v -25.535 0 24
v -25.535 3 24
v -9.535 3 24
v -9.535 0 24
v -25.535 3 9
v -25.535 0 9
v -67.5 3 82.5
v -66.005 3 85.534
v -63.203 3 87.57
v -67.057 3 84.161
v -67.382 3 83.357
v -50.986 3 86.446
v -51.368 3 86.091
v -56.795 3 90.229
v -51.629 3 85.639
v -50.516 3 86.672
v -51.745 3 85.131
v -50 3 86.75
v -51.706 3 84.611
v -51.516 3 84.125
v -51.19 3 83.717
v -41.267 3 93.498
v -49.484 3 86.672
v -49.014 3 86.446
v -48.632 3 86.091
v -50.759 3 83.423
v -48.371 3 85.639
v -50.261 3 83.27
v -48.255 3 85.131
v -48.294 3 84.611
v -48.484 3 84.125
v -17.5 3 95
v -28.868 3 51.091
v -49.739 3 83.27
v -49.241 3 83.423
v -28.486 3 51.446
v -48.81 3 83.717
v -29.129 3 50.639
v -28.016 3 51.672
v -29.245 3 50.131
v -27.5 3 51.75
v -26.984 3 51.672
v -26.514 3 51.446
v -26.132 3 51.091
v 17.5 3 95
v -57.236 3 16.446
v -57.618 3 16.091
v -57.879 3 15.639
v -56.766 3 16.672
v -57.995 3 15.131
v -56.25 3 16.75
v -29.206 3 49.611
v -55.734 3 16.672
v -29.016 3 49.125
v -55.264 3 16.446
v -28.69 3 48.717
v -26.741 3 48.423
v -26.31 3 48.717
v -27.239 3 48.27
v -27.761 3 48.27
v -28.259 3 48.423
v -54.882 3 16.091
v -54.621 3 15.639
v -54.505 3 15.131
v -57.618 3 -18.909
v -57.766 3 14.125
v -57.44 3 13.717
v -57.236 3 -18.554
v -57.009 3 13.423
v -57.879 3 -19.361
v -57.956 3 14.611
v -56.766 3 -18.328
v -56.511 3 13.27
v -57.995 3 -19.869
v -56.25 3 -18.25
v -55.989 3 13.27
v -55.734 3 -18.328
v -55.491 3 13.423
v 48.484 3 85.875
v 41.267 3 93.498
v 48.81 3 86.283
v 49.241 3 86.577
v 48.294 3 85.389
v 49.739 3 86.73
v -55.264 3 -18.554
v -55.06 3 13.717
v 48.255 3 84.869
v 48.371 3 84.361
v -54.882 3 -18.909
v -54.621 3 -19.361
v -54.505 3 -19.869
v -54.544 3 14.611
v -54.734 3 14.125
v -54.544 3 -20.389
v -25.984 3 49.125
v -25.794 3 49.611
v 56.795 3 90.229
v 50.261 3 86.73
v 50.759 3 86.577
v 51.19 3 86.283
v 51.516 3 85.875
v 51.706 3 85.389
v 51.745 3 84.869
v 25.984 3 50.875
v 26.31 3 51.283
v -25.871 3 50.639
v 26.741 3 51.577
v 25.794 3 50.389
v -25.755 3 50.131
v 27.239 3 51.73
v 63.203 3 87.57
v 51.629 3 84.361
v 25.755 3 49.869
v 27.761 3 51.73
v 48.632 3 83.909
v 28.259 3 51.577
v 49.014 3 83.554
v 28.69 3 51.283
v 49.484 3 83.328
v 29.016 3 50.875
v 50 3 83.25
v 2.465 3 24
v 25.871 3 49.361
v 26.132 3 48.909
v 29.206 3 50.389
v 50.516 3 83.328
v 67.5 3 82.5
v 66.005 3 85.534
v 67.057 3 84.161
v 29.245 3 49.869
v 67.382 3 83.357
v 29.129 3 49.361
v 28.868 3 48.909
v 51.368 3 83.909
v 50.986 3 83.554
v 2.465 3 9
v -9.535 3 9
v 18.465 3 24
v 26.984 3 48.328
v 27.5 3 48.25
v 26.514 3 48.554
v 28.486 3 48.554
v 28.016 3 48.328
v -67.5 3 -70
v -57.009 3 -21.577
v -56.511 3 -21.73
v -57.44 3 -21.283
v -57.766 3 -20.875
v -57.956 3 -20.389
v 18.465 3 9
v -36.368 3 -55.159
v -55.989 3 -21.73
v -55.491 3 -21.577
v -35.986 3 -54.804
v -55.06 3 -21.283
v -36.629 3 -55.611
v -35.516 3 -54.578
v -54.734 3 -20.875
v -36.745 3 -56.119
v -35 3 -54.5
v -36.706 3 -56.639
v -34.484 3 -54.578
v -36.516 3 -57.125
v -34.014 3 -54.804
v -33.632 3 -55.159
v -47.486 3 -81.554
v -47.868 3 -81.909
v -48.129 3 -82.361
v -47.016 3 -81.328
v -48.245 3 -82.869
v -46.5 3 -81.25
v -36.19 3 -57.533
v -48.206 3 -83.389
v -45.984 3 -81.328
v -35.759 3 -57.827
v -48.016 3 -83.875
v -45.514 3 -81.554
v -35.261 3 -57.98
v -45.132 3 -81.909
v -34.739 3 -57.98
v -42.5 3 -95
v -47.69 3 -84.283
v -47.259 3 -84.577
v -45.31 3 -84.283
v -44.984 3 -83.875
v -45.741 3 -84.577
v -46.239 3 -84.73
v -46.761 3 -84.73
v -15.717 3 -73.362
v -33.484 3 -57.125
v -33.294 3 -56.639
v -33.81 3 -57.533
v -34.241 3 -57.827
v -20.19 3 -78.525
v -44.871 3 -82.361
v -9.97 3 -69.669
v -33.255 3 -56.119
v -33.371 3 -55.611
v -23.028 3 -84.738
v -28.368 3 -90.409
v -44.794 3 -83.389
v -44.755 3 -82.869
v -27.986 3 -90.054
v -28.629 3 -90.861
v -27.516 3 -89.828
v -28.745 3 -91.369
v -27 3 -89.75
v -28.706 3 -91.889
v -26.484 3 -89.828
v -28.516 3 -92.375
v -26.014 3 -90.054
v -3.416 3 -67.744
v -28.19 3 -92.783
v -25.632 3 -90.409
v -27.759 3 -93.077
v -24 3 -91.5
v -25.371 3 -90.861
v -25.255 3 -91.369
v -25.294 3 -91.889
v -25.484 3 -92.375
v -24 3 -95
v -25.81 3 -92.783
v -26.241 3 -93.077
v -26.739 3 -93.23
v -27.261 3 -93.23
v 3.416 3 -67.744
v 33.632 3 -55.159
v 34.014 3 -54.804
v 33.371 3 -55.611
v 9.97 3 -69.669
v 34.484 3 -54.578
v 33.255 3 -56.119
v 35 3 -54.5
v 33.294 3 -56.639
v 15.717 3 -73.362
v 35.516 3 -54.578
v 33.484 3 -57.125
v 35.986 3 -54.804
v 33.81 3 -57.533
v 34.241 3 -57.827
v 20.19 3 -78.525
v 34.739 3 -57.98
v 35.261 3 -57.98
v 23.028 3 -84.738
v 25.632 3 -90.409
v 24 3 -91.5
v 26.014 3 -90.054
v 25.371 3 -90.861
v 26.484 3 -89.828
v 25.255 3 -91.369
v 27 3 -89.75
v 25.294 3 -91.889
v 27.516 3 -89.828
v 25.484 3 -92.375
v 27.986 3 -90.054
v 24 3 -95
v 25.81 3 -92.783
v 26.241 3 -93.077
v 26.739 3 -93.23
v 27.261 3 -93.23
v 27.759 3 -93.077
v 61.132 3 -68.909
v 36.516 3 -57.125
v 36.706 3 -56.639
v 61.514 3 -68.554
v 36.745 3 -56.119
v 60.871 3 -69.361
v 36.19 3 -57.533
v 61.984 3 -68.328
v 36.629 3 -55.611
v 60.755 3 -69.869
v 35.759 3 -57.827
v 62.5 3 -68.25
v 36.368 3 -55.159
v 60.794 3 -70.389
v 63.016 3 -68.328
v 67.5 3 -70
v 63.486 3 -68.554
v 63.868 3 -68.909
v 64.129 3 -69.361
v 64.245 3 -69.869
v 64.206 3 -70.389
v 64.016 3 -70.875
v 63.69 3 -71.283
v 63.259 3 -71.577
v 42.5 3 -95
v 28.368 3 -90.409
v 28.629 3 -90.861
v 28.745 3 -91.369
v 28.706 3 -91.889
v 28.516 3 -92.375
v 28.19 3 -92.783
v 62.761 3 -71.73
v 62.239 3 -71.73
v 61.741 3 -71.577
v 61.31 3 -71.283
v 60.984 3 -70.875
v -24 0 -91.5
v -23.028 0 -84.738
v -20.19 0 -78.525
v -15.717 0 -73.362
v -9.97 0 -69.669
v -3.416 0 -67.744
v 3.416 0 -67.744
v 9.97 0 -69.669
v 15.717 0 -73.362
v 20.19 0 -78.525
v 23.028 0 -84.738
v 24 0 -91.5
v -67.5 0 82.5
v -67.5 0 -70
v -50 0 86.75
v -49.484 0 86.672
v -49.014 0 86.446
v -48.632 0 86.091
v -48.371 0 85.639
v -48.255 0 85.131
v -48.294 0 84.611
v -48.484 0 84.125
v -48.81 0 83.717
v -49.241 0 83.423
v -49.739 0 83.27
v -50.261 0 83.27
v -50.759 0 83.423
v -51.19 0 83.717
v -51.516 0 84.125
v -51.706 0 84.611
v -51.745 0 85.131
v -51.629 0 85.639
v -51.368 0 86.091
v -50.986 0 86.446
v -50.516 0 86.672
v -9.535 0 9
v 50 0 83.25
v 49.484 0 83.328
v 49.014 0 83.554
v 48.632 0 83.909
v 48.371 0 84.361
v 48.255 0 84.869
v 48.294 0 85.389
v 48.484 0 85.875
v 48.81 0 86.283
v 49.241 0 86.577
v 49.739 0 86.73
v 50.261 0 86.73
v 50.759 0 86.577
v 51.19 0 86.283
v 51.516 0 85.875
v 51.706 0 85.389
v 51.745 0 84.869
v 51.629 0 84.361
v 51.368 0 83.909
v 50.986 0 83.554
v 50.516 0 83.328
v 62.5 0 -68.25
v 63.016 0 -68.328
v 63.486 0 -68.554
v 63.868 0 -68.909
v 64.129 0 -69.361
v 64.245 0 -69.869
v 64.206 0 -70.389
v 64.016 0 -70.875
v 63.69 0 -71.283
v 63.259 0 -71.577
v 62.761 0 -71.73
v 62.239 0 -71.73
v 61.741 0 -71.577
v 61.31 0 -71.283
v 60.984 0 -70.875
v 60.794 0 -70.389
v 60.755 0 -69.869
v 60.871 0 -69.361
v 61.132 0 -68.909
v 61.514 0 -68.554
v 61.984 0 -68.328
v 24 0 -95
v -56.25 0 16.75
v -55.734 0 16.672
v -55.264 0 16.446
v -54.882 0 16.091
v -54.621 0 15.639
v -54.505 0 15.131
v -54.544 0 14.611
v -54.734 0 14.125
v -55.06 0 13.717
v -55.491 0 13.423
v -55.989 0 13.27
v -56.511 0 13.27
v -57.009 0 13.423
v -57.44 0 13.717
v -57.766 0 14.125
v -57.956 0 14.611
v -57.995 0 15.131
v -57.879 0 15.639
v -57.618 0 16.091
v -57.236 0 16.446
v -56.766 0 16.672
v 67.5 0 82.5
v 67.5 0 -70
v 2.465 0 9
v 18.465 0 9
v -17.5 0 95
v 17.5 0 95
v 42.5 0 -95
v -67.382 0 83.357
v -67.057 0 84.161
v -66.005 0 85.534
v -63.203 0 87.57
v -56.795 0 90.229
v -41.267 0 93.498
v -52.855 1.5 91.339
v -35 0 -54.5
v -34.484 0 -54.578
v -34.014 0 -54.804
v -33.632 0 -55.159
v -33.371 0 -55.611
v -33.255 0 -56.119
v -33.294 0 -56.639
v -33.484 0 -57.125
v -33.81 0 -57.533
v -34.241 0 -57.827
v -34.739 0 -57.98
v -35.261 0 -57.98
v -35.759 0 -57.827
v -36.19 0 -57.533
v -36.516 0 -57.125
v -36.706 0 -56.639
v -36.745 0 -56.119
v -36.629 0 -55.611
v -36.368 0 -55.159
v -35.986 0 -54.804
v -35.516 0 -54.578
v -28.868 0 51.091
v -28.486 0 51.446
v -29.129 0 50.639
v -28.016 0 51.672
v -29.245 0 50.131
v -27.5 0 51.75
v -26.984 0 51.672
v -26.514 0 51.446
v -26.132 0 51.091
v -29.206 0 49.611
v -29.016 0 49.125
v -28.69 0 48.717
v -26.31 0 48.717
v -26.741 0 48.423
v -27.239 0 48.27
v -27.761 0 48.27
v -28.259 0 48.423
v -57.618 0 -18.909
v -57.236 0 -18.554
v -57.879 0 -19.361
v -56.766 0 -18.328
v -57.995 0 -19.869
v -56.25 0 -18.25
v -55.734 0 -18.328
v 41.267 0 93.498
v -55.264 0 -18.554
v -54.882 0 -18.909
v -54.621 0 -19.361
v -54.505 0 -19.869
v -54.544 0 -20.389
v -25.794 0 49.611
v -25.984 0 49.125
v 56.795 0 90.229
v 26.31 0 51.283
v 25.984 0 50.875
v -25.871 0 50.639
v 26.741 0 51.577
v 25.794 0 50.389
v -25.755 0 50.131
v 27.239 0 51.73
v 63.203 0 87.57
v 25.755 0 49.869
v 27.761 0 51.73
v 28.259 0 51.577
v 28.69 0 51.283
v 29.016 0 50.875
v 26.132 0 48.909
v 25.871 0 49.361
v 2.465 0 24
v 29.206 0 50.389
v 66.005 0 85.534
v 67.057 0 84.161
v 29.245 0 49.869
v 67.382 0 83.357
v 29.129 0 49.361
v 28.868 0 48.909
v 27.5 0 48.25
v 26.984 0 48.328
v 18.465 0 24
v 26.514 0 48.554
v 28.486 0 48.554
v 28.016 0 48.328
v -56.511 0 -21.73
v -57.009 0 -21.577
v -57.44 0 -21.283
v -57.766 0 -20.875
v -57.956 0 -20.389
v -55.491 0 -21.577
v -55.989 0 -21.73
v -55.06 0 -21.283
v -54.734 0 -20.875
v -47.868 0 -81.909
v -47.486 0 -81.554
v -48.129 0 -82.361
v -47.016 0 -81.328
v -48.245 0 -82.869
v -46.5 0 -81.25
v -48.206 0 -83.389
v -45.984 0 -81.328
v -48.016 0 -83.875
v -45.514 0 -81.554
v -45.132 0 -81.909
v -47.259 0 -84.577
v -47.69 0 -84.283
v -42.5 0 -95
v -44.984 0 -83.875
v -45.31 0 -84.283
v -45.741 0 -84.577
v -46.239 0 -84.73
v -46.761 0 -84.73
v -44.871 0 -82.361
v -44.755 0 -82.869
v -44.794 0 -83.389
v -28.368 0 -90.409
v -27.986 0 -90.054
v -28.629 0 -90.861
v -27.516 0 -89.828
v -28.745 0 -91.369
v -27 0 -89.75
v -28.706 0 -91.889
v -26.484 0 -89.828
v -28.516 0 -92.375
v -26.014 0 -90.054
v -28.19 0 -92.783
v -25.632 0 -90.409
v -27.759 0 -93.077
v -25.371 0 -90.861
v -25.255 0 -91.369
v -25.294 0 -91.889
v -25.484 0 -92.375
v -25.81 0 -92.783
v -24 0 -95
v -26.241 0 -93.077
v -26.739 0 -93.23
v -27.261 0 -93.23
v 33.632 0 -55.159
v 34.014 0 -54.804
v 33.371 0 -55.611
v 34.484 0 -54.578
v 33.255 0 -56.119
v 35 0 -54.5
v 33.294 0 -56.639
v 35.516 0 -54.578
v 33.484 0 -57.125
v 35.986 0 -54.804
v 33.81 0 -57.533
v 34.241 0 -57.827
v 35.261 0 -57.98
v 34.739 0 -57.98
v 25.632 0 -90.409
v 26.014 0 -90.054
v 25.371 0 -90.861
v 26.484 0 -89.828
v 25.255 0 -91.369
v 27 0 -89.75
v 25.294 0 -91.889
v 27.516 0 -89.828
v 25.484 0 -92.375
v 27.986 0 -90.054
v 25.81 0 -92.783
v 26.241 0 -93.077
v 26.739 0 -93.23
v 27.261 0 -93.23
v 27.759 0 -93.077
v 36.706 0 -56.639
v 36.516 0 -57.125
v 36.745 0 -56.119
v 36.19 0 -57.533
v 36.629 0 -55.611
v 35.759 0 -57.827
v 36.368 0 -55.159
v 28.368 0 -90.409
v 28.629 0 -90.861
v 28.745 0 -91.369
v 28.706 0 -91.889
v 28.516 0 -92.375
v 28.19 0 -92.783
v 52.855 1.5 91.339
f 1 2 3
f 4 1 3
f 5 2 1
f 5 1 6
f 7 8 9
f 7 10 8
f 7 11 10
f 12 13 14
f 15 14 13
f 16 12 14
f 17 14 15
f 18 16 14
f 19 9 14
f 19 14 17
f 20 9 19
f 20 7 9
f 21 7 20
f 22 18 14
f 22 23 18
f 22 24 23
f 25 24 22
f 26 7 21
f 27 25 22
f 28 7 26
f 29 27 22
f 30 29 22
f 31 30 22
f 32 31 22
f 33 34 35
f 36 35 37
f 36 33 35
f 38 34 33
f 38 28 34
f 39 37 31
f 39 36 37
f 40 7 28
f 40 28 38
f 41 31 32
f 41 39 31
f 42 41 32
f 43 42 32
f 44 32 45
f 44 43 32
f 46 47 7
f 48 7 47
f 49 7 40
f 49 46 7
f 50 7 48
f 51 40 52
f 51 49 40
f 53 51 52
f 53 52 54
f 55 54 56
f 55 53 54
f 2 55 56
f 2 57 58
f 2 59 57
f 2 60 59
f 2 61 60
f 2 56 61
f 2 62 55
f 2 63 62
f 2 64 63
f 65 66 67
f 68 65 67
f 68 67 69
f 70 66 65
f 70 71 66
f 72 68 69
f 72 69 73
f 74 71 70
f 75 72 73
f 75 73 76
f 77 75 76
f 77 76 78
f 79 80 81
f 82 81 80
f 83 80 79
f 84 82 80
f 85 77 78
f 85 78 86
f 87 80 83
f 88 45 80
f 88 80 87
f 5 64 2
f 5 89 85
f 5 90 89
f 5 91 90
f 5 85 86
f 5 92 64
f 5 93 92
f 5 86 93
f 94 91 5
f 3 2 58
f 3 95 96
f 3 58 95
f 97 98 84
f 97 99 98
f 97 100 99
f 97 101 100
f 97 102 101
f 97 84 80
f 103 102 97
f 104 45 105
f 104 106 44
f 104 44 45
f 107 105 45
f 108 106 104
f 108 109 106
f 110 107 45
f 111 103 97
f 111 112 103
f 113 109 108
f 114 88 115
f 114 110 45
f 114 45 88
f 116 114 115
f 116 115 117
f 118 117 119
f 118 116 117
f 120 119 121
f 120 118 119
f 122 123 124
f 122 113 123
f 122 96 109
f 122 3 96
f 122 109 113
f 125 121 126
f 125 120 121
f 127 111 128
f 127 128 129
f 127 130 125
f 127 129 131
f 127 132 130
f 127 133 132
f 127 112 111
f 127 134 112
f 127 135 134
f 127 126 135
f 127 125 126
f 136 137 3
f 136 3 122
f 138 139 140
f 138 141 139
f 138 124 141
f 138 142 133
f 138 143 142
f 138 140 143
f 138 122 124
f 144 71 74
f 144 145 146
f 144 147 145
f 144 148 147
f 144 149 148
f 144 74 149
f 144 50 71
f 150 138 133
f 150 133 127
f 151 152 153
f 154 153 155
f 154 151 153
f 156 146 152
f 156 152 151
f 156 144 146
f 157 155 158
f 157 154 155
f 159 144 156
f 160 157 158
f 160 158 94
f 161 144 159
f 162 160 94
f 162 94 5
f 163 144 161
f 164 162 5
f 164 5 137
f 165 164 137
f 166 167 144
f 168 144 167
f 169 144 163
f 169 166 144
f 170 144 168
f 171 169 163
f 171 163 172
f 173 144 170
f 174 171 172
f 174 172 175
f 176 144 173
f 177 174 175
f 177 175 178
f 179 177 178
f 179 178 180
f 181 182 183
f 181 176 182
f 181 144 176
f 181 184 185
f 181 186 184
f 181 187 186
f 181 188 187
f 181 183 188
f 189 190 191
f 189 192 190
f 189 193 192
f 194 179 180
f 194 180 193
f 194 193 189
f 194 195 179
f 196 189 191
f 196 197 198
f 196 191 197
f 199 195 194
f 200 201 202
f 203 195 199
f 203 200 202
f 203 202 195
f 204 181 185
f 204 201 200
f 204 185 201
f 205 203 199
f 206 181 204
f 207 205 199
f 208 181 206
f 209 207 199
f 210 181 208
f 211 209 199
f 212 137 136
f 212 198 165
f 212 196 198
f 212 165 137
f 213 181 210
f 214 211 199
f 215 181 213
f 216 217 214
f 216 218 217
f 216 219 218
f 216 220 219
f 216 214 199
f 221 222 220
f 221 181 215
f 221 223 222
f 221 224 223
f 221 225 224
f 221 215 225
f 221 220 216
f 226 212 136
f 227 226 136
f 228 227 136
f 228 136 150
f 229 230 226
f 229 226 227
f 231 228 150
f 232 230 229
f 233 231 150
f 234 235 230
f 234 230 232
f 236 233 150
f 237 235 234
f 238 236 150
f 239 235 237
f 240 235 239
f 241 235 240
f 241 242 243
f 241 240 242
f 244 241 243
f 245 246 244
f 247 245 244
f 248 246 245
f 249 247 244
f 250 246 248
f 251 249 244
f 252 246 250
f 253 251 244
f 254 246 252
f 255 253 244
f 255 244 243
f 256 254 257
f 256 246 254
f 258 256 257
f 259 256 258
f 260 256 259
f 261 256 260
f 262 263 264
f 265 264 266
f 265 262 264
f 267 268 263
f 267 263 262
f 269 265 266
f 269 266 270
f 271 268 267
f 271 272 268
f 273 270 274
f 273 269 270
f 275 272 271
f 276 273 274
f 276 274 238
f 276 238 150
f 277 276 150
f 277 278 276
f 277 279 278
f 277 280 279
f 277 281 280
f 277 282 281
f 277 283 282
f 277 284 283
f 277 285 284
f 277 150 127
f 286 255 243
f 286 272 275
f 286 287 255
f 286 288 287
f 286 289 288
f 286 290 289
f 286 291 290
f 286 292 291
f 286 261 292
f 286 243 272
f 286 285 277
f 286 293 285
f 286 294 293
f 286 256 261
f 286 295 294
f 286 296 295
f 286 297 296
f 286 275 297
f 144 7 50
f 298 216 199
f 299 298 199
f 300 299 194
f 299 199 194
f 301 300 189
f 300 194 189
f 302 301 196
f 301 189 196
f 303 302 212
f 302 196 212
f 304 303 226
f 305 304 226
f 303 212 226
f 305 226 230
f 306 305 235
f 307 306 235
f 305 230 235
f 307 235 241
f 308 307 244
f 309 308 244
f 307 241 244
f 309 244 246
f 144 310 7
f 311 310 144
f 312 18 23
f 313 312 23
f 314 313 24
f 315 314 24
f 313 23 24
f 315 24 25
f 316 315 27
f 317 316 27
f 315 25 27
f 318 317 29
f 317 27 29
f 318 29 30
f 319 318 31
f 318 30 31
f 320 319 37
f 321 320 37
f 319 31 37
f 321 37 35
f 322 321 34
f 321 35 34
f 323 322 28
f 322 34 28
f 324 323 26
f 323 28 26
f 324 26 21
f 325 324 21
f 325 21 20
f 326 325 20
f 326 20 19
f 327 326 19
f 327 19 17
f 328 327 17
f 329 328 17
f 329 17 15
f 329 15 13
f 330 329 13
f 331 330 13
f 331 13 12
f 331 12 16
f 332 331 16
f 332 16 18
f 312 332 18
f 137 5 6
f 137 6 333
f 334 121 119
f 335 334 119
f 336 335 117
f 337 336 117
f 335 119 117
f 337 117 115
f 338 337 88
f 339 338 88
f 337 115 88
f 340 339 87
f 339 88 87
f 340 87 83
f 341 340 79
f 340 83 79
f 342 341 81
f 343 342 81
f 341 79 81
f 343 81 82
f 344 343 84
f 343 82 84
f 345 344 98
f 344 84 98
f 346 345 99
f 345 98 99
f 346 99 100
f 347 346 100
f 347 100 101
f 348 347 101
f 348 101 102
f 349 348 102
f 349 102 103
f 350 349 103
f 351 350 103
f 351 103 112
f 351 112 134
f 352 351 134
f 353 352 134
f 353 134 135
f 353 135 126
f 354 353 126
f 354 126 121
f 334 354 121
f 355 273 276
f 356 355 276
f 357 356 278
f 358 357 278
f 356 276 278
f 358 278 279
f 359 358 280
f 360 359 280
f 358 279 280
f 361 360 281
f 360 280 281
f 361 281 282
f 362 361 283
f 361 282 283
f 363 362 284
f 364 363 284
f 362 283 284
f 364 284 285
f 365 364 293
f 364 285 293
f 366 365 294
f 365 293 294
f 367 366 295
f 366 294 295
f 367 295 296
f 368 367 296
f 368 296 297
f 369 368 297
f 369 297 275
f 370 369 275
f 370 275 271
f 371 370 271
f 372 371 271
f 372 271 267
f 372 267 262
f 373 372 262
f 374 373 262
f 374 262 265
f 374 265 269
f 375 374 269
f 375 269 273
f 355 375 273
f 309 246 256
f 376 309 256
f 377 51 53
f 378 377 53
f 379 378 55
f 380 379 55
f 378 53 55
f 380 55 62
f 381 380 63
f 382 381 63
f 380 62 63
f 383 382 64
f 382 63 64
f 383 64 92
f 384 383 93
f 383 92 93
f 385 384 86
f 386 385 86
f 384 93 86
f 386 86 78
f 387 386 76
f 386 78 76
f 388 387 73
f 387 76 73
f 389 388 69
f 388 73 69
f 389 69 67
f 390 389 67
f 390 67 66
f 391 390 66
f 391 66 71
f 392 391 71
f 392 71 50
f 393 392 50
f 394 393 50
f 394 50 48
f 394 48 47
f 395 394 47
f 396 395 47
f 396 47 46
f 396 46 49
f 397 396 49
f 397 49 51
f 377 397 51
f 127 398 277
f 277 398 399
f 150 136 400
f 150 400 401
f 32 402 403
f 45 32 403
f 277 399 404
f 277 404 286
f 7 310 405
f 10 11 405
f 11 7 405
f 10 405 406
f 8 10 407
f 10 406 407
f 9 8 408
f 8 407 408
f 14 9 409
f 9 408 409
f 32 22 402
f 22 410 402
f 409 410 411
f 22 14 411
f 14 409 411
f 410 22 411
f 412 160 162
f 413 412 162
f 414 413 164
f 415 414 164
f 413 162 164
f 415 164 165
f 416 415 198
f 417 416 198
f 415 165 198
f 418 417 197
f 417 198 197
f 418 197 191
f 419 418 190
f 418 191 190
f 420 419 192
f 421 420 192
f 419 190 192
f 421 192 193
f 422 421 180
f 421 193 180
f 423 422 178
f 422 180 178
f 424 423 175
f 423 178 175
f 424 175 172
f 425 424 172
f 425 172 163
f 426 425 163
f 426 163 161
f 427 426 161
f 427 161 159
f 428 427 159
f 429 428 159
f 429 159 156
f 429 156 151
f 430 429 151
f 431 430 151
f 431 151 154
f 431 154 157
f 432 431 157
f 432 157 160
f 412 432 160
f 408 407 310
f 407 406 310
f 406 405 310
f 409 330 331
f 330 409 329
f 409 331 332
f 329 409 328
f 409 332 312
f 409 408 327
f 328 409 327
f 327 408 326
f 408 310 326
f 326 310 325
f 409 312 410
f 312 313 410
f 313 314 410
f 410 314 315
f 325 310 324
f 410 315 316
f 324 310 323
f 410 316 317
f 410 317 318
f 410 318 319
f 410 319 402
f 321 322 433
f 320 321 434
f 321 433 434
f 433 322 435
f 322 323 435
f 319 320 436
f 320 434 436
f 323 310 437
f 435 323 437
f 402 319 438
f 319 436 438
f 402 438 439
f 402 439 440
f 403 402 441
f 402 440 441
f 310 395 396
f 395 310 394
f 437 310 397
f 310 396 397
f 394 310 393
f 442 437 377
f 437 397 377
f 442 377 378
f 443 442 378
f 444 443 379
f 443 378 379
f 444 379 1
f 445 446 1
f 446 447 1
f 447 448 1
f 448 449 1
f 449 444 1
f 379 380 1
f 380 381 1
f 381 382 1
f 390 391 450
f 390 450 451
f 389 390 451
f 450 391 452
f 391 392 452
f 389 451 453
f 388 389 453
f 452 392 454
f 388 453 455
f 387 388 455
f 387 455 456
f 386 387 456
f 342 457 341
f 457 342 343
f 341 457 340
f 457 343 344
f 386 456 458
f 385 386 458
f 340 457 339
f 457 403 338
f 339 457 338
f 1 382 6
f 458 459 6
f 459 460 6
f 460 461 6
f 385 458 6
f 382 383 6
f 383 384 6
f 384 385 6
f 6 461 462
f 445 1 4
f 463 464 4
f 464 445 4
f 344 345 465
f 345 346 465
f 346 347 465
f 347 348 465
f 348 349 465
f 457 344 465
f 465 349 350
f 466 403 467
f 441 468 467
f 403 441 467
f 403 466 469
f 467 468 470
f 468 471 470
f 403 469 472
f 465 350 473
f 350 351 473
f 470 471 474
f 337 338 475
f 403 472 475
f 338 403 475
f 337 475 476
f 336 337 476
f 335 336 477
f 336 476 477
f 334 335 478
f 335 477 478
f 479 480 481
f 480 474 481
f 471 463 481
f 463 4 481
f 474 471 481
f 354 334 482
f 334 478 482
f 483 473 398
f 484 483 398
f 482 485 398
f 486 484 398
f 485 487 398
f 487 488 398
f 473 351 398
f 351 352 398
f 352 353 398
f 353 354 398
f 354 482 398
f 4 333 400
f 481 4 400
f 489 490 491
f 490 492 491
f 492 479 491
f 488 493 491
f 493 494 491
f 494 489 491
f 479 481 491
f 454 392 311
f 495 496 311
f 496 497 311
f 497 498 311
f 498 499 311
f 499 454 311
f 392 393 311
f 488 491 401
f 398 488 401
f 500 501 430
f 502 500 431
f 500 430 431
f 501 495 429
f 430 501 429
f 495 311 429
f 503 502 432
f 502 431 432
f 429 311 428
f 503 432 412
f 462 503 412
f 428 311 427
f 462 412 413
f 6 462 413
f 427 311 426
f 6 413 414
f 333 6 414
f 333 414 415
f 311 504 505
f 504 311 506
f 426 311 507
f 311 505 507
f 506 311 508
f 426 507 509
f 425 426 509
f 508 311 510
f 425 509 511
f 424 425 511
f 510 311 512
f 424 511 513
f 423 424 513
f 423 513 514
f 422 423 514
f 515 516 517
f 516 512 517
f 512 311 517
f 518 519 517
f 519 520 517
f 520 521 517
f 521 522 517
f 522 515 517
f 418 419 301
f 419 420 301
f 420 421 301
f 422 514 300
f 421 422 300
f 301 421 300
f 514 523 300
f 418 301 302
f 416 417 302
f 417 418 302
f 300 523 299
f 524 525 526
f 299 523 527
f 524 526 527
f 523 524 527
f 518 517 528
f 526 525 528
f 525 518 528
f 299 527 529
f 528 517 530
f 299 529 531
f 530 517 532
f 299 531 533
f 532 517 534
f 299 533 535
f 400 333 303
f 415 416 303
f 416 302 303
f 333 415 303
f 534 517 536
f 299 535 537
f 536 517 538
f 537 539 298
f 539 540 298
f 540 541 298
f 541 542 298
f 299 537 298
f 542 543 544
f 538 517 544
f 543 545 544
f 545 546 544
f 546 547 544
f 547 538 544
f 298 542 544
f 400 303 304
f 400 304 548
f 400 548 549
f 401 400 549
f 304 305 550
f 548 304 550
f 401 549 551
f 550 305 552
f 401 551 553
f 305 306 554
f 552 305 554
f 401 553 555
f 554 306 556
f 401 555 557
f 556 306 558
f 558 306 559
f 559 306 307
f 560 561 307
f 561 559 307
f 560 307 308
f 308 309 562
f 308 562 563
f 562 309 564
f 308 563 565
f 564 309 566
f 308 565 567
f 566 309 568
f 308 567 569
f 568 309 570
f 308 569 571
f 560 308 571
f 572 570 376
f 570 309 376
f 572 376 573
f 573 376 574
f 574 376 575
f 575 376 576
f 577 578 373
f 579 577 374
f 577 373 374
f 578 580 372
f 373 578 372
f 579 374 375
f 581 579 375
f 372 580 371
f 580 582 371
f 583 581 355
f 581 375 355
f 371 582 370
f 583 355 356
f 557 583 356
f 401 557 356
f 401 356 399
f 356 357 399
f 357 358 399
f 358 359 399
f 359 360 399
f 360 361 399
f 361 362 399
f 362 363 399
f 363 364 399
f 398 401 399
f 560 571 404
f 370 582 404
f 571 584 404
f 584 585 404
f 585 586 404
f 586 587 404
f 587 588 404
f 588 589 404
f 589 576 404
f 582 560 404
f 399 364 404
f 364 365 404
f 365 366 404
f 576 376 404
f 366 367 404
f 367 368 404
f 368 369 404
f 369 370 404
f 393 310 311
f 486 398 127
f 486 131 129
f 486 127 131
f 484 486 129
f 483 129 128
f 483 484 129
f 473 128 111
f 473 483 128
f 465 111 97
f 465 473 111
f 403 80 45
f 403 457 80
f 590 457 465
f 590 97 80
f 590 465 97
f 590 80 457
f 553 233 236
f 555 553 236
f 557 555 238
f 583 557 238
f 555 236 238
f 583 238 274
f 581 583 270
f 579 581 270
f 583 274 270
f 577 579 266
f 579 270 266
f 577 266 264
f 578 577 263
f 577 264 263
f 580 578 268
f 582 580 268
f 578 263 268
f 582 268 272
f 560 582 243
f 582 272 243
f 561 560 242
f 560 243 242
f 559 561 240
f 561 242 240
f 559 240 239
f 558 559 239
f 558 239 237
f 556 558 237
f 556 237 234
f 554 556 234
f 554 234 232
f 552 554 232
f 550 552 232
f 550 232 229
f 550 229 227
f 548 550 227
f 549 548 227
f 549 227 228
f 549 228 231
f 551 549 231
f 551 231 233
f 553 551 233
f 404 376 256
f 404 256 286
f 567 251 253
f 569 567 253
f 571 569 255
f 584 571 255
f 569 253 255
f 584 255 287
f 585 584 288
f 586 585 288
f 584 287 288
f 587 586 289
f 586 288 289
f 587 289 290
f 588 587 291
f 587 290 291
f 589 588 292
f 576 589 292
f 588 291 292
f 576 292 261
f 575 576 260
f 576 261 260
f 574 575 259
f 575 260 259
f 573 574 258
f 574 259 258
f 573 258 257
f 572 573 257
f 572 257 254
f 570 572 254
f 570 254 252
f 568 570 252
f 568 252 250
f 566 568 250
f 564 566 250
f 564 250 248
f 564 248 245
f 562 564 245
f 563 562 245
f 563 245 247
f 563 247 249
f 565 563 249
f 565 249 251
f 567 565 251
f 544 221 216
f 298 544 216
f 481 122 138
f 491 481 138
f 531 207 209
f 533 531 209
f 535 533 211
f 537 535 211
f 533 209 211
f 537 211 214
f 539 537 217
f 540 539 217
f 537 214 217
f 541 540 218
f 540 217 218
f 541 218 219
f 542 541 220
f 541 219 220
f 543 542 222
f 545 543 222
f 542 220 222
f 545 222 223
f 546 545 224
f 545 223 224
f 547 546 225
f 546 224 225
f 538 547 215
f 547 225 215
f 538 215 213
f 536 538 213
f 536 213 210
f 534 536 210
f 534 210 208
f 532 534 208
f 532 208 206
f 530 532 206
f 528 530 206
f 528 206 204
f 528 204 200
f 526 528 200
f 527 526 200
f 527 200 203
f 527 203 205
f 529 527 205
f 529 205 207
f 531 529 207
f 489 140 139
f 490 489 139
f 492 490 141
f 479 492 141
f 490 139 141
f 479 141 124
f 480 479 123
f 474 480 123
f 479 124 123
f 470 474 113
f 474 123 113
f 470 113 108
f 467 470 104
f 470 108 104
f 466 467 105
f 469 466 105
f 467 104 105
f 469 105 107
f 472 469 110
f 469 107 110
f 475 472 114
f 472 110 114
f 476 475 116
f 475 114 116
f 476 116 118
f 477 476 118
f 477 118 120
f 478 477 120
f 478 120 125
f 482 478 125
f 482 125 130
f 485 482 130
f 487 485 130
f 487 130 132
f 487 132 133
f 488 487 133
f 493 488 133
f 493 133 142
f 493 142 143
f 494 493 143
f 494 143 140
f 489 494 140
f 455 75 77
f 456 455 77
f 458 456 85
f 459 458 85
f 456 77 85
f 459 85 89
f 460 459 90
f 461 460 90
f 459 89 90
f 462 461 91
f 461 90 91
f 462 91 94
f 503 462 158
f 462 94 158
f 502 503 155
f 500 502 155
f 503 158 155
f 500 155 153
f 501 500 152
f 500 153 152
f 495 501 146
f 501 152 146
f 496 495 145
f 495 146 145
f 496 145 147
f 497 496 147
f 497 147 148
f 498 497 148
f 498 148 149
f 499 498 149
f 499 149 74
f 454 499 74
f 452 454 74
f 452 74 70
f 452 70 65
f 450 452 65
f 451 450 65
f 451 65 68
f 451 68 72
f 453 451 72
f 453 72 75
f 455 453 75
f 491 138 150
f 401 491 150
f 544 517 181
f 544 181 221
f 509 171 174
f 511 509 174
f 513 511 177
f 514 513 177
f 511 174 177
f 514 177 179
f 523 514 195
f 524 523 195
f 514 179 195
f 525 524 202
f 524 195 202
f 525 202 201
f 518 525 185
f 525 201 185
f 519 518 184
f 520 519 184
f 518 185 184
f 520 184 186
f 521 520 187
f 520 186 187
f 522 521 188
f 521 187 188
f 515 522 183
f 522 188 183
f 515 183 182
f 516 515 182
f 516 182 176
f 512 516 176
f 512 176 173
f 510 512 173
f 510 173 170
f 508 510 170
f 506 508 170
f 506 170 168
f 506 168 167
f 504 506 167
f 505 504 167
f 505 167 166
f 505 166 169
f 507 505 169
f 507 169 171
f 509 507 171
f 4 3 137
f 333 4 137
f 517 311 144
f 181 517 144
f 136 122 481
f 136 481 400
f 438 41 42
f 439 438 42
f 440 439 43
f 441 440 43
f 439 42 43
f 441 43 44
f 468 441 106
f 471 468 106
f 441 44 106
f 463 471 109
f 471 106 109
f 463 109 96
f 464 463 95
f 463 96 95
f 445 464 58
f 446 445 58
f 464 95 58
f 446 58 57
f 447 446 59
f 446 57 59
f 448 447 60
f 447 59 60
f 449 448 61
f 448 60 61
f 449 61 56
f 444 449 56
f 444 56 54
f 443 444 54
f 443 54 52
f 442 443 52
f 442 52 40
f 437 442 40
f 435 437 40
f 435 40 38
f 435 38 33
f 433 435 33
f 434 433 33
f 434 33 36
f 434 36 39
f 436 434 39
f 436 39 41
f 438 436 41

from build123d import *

# Parameters (mm, degrees)
SKETCH2_W           = 135
SKETCH2_H           = 190
BOSS_EXTRUDE2_DEPTH = 3
SKETCH3_R           = 1.75
CUT_EXTRUDE1_DEPTH  = 117.577227622
FILLET1_SIZE        = 12.5
FILLET1_SIZE_2      = 50
FILLET2_SIZE        = 12.5
FILLET2_SIZE_2      = 50
CHAMFER2_SIZE       = 25
CHAMFER3_SIZE       = 25
CUT_EXTRUDE5_DEPTH  = 117.577227764
SKETCH8_R           = 1.75
CUT_EXTRUDE6_DEPTH  = 117.577227764
SKETCH9_R           = 1.75
CUT_EXTRUDE7_DEPTH  = 117.577227764
SKETCH11_R          = 1.75
CUT_EXTRUDE8_DEPTH  = 117.577227764
SKETCH12_W          = 16
SKETCH12_H          = 15
CUT_EXTRUDE9_DEPTH  = 117.577227764


with BuildPart() as part:
    # Sketch2 → Boss-Extrude2 (new body)
    with BuildSketch(Plane(origin=(0, 0, 0), x_dir=(1, 0, 0), z_dir=(0, 1, 0))):
        Rectangle(SKETCH2_W, SKETCH2_H)
    extrude(amount=BOSS_EXTRUDE2_DEPTH)

    # Sketch3 → Cut-Extrude1 (cut, through all)
    with BuildSketch(Plane(origin=(0, 3, 0), x_dir=(1, 0, 0), z_dir=(0, 1, 0))):
        with Locations(Location((-27.5, -50, 0), (0, 0, 270))):
            Circle(SKETCH3_R)
        with Locations(Location((27.5, -50, 0), (0, 0, 90))):
            Circle(SKETCH3_R)
        with Locations(Location((-50, -85, 0), (0, 0, 270))):
            Circle(SKETCH3_R)
        with Locations(Location((50, -85, 0), (0, 0, 90))):
            Circle(SKETCH3_R)
    extrude(amount=-CUT_EXTRUDE1_DEPTH, mode=Mode.SUBTRACT)

    # Fillet1
    # an asymmetric fillet: 50, 12.5 mm, written as the material it takes off along each edge
    with BuildSketch(Plane(origin=(-67.5, -125, 95), x_dir=(0, 0, -1), z_dir=(0, 1, 0))) as fillet1_piece_1:
        with BuildLine():
            Bezier((FILLET1_SIZE, 0), (0, 0), (0, -FILLET1_SIZE_2), weights=[1, 0.707106781, 1])
            Line((0, -FILLET1_SIZE_2), (0, 0))
            Line((0, 0), (FILLET1_SIZE, 0))
        make_face()
    extrude(amount=253, mode=Mode.SUBTRACT)

    # Fillet2
    # an asymmetric fillet: 50, 12.5 mm, written as the material it takes off along each edge
    with BuildSketch(Plane(origin=(67.5, -125, 95), x_dir=(0, 0, -1), z_dir=(0, 1, 0))) as fillet2_piece_1:
        with BuildLine():
            Bezier((FILLET2_SIZE, 0), (0, 0), (0, FILLET2_SIZE_2), weights=[1, 0.707106781, 1])
            Line((0, FILLET2_SIZE_2), (0, 0))
            Line((0, 0), (FILLET2_SIZE, 0))
        make_face()
    extrude(amount=253, mode=Mode.SUBTRACT)

    # Chamfer2
    chamfer2_edges = [part.edges().sort_by_distance(p)[0] for p in [
        (67.5, 1.5, -95),
    ]]
    chamfer(chamfer2_edges, length=CHAMFER2_SIZE)

    # Chamfer3
    chamfer3_edges = [part.edges().sort_by_distance(p)[0] for p in [
        (-67.5, 1.5, -95),
    ]]
    chamfer(chamfer3_edges, length=CHAMFER3_SIZE)

    # Sketch7 → Cut-Extrude5 (cut, through all)
    with BuildSketch(Plane(origin=(0, 3, 0), x_dir=(1, 0, 0), z_dir=(0, 1, 0))):
        with BuildLine():
            Line((24, 91.5), (24, 95))
            Line((24, 95), (-24, 95))
            Line((-24, 95), (-24, 91.5))
            ThreePointArc((-24, 91.5), (0, 67.5), (24, 91.5))
        make_face()
    extrude(amount=-CUT_EXTRUDE5_DEPTH, mode=Mode.SUBTRACT)

    # Sketch8 → Cut-Extrude6 (cut, through all)
    with BuildSketch(Plane(origin=(0, 3, 0), x_dir=(1, 0, 0), z_dir=(0, 1, 0))):
        with Locations(Location((-27, 91.5, 0), (0, 0, 270))):
            Circle(SKETCH8_R)
        with Locations(Location((27, 91.5, 0), (0, 0, 270))):
            Circle(SKETCH8_R)
    extrude(amount=-CUT_EXTRUDE6_DEPTH, mode=Mode.SUBTRACT)

    # Sketch9 → Cut-Extrude7 (cut, through all)
    with BuildSketch(Plane(origin=(0, 3, 0), x_dir=(1, 0, 0), z_dir=(0, 1, 0))):
        with Locations(Location((-56.25, -15, 0), (0, 0, 270))):
            Circle(SKETCH9_R)
        with Locations(Location((-35, 56.25, 0), (0, 0, 270))):
            Circle(SKETCH9_R)
        with Locations(Location((-56.25, 20, 0), (0, 0, 270))):
            Circle(SKETCH9_R)
        with Locations(Location((35, 56.25, 0), (0, 0, 270))):
            Circle(SKETCH9_R)
    extrude(amount=-CUT_EXTRUDE7_DEPTH, mode=Mode.SUBTRACT)

    # Sketch11 → Cut-Extrude8 (cut, through all)
    with BuildSketch(Plane(origin=(0, 3, 0), x_dir=(1, 0, 0), z_dir=(0, 1, 0))):
        with Locations(Location((62.5, 70, 0), (0, 0, 270))):
            Circle(SKETCH11_R)
        with Locations(Location((-46.5, 83, 0), (0, 0, 270))):
            Circle(SKETCH11_R)
    extrude(amount=-CUT_EXTRUDE8_DEPTH, mode=Mode.SUBTRACT)

    # Sketch12 → Cut-Extrude9 (cut, through all)
    with BuildSketch(Plane(origin=(0, 3, 0), x_dir=(1, 0, 0), z_dir=(0, 1, 0))):
        with Locations((-17.534965815, -16.5)):
            Rectangle(SKETCH12_W, SKETCH12_H)
        with Locations((10.465034185, -16.5)):
            Rectangle(SKETCH12_W, SKETCH12_H)
    extrude(amount=-CUT_EXTRUDE9_DEPTH, mode=Mode.SUBTRACT)


solid = part.part
